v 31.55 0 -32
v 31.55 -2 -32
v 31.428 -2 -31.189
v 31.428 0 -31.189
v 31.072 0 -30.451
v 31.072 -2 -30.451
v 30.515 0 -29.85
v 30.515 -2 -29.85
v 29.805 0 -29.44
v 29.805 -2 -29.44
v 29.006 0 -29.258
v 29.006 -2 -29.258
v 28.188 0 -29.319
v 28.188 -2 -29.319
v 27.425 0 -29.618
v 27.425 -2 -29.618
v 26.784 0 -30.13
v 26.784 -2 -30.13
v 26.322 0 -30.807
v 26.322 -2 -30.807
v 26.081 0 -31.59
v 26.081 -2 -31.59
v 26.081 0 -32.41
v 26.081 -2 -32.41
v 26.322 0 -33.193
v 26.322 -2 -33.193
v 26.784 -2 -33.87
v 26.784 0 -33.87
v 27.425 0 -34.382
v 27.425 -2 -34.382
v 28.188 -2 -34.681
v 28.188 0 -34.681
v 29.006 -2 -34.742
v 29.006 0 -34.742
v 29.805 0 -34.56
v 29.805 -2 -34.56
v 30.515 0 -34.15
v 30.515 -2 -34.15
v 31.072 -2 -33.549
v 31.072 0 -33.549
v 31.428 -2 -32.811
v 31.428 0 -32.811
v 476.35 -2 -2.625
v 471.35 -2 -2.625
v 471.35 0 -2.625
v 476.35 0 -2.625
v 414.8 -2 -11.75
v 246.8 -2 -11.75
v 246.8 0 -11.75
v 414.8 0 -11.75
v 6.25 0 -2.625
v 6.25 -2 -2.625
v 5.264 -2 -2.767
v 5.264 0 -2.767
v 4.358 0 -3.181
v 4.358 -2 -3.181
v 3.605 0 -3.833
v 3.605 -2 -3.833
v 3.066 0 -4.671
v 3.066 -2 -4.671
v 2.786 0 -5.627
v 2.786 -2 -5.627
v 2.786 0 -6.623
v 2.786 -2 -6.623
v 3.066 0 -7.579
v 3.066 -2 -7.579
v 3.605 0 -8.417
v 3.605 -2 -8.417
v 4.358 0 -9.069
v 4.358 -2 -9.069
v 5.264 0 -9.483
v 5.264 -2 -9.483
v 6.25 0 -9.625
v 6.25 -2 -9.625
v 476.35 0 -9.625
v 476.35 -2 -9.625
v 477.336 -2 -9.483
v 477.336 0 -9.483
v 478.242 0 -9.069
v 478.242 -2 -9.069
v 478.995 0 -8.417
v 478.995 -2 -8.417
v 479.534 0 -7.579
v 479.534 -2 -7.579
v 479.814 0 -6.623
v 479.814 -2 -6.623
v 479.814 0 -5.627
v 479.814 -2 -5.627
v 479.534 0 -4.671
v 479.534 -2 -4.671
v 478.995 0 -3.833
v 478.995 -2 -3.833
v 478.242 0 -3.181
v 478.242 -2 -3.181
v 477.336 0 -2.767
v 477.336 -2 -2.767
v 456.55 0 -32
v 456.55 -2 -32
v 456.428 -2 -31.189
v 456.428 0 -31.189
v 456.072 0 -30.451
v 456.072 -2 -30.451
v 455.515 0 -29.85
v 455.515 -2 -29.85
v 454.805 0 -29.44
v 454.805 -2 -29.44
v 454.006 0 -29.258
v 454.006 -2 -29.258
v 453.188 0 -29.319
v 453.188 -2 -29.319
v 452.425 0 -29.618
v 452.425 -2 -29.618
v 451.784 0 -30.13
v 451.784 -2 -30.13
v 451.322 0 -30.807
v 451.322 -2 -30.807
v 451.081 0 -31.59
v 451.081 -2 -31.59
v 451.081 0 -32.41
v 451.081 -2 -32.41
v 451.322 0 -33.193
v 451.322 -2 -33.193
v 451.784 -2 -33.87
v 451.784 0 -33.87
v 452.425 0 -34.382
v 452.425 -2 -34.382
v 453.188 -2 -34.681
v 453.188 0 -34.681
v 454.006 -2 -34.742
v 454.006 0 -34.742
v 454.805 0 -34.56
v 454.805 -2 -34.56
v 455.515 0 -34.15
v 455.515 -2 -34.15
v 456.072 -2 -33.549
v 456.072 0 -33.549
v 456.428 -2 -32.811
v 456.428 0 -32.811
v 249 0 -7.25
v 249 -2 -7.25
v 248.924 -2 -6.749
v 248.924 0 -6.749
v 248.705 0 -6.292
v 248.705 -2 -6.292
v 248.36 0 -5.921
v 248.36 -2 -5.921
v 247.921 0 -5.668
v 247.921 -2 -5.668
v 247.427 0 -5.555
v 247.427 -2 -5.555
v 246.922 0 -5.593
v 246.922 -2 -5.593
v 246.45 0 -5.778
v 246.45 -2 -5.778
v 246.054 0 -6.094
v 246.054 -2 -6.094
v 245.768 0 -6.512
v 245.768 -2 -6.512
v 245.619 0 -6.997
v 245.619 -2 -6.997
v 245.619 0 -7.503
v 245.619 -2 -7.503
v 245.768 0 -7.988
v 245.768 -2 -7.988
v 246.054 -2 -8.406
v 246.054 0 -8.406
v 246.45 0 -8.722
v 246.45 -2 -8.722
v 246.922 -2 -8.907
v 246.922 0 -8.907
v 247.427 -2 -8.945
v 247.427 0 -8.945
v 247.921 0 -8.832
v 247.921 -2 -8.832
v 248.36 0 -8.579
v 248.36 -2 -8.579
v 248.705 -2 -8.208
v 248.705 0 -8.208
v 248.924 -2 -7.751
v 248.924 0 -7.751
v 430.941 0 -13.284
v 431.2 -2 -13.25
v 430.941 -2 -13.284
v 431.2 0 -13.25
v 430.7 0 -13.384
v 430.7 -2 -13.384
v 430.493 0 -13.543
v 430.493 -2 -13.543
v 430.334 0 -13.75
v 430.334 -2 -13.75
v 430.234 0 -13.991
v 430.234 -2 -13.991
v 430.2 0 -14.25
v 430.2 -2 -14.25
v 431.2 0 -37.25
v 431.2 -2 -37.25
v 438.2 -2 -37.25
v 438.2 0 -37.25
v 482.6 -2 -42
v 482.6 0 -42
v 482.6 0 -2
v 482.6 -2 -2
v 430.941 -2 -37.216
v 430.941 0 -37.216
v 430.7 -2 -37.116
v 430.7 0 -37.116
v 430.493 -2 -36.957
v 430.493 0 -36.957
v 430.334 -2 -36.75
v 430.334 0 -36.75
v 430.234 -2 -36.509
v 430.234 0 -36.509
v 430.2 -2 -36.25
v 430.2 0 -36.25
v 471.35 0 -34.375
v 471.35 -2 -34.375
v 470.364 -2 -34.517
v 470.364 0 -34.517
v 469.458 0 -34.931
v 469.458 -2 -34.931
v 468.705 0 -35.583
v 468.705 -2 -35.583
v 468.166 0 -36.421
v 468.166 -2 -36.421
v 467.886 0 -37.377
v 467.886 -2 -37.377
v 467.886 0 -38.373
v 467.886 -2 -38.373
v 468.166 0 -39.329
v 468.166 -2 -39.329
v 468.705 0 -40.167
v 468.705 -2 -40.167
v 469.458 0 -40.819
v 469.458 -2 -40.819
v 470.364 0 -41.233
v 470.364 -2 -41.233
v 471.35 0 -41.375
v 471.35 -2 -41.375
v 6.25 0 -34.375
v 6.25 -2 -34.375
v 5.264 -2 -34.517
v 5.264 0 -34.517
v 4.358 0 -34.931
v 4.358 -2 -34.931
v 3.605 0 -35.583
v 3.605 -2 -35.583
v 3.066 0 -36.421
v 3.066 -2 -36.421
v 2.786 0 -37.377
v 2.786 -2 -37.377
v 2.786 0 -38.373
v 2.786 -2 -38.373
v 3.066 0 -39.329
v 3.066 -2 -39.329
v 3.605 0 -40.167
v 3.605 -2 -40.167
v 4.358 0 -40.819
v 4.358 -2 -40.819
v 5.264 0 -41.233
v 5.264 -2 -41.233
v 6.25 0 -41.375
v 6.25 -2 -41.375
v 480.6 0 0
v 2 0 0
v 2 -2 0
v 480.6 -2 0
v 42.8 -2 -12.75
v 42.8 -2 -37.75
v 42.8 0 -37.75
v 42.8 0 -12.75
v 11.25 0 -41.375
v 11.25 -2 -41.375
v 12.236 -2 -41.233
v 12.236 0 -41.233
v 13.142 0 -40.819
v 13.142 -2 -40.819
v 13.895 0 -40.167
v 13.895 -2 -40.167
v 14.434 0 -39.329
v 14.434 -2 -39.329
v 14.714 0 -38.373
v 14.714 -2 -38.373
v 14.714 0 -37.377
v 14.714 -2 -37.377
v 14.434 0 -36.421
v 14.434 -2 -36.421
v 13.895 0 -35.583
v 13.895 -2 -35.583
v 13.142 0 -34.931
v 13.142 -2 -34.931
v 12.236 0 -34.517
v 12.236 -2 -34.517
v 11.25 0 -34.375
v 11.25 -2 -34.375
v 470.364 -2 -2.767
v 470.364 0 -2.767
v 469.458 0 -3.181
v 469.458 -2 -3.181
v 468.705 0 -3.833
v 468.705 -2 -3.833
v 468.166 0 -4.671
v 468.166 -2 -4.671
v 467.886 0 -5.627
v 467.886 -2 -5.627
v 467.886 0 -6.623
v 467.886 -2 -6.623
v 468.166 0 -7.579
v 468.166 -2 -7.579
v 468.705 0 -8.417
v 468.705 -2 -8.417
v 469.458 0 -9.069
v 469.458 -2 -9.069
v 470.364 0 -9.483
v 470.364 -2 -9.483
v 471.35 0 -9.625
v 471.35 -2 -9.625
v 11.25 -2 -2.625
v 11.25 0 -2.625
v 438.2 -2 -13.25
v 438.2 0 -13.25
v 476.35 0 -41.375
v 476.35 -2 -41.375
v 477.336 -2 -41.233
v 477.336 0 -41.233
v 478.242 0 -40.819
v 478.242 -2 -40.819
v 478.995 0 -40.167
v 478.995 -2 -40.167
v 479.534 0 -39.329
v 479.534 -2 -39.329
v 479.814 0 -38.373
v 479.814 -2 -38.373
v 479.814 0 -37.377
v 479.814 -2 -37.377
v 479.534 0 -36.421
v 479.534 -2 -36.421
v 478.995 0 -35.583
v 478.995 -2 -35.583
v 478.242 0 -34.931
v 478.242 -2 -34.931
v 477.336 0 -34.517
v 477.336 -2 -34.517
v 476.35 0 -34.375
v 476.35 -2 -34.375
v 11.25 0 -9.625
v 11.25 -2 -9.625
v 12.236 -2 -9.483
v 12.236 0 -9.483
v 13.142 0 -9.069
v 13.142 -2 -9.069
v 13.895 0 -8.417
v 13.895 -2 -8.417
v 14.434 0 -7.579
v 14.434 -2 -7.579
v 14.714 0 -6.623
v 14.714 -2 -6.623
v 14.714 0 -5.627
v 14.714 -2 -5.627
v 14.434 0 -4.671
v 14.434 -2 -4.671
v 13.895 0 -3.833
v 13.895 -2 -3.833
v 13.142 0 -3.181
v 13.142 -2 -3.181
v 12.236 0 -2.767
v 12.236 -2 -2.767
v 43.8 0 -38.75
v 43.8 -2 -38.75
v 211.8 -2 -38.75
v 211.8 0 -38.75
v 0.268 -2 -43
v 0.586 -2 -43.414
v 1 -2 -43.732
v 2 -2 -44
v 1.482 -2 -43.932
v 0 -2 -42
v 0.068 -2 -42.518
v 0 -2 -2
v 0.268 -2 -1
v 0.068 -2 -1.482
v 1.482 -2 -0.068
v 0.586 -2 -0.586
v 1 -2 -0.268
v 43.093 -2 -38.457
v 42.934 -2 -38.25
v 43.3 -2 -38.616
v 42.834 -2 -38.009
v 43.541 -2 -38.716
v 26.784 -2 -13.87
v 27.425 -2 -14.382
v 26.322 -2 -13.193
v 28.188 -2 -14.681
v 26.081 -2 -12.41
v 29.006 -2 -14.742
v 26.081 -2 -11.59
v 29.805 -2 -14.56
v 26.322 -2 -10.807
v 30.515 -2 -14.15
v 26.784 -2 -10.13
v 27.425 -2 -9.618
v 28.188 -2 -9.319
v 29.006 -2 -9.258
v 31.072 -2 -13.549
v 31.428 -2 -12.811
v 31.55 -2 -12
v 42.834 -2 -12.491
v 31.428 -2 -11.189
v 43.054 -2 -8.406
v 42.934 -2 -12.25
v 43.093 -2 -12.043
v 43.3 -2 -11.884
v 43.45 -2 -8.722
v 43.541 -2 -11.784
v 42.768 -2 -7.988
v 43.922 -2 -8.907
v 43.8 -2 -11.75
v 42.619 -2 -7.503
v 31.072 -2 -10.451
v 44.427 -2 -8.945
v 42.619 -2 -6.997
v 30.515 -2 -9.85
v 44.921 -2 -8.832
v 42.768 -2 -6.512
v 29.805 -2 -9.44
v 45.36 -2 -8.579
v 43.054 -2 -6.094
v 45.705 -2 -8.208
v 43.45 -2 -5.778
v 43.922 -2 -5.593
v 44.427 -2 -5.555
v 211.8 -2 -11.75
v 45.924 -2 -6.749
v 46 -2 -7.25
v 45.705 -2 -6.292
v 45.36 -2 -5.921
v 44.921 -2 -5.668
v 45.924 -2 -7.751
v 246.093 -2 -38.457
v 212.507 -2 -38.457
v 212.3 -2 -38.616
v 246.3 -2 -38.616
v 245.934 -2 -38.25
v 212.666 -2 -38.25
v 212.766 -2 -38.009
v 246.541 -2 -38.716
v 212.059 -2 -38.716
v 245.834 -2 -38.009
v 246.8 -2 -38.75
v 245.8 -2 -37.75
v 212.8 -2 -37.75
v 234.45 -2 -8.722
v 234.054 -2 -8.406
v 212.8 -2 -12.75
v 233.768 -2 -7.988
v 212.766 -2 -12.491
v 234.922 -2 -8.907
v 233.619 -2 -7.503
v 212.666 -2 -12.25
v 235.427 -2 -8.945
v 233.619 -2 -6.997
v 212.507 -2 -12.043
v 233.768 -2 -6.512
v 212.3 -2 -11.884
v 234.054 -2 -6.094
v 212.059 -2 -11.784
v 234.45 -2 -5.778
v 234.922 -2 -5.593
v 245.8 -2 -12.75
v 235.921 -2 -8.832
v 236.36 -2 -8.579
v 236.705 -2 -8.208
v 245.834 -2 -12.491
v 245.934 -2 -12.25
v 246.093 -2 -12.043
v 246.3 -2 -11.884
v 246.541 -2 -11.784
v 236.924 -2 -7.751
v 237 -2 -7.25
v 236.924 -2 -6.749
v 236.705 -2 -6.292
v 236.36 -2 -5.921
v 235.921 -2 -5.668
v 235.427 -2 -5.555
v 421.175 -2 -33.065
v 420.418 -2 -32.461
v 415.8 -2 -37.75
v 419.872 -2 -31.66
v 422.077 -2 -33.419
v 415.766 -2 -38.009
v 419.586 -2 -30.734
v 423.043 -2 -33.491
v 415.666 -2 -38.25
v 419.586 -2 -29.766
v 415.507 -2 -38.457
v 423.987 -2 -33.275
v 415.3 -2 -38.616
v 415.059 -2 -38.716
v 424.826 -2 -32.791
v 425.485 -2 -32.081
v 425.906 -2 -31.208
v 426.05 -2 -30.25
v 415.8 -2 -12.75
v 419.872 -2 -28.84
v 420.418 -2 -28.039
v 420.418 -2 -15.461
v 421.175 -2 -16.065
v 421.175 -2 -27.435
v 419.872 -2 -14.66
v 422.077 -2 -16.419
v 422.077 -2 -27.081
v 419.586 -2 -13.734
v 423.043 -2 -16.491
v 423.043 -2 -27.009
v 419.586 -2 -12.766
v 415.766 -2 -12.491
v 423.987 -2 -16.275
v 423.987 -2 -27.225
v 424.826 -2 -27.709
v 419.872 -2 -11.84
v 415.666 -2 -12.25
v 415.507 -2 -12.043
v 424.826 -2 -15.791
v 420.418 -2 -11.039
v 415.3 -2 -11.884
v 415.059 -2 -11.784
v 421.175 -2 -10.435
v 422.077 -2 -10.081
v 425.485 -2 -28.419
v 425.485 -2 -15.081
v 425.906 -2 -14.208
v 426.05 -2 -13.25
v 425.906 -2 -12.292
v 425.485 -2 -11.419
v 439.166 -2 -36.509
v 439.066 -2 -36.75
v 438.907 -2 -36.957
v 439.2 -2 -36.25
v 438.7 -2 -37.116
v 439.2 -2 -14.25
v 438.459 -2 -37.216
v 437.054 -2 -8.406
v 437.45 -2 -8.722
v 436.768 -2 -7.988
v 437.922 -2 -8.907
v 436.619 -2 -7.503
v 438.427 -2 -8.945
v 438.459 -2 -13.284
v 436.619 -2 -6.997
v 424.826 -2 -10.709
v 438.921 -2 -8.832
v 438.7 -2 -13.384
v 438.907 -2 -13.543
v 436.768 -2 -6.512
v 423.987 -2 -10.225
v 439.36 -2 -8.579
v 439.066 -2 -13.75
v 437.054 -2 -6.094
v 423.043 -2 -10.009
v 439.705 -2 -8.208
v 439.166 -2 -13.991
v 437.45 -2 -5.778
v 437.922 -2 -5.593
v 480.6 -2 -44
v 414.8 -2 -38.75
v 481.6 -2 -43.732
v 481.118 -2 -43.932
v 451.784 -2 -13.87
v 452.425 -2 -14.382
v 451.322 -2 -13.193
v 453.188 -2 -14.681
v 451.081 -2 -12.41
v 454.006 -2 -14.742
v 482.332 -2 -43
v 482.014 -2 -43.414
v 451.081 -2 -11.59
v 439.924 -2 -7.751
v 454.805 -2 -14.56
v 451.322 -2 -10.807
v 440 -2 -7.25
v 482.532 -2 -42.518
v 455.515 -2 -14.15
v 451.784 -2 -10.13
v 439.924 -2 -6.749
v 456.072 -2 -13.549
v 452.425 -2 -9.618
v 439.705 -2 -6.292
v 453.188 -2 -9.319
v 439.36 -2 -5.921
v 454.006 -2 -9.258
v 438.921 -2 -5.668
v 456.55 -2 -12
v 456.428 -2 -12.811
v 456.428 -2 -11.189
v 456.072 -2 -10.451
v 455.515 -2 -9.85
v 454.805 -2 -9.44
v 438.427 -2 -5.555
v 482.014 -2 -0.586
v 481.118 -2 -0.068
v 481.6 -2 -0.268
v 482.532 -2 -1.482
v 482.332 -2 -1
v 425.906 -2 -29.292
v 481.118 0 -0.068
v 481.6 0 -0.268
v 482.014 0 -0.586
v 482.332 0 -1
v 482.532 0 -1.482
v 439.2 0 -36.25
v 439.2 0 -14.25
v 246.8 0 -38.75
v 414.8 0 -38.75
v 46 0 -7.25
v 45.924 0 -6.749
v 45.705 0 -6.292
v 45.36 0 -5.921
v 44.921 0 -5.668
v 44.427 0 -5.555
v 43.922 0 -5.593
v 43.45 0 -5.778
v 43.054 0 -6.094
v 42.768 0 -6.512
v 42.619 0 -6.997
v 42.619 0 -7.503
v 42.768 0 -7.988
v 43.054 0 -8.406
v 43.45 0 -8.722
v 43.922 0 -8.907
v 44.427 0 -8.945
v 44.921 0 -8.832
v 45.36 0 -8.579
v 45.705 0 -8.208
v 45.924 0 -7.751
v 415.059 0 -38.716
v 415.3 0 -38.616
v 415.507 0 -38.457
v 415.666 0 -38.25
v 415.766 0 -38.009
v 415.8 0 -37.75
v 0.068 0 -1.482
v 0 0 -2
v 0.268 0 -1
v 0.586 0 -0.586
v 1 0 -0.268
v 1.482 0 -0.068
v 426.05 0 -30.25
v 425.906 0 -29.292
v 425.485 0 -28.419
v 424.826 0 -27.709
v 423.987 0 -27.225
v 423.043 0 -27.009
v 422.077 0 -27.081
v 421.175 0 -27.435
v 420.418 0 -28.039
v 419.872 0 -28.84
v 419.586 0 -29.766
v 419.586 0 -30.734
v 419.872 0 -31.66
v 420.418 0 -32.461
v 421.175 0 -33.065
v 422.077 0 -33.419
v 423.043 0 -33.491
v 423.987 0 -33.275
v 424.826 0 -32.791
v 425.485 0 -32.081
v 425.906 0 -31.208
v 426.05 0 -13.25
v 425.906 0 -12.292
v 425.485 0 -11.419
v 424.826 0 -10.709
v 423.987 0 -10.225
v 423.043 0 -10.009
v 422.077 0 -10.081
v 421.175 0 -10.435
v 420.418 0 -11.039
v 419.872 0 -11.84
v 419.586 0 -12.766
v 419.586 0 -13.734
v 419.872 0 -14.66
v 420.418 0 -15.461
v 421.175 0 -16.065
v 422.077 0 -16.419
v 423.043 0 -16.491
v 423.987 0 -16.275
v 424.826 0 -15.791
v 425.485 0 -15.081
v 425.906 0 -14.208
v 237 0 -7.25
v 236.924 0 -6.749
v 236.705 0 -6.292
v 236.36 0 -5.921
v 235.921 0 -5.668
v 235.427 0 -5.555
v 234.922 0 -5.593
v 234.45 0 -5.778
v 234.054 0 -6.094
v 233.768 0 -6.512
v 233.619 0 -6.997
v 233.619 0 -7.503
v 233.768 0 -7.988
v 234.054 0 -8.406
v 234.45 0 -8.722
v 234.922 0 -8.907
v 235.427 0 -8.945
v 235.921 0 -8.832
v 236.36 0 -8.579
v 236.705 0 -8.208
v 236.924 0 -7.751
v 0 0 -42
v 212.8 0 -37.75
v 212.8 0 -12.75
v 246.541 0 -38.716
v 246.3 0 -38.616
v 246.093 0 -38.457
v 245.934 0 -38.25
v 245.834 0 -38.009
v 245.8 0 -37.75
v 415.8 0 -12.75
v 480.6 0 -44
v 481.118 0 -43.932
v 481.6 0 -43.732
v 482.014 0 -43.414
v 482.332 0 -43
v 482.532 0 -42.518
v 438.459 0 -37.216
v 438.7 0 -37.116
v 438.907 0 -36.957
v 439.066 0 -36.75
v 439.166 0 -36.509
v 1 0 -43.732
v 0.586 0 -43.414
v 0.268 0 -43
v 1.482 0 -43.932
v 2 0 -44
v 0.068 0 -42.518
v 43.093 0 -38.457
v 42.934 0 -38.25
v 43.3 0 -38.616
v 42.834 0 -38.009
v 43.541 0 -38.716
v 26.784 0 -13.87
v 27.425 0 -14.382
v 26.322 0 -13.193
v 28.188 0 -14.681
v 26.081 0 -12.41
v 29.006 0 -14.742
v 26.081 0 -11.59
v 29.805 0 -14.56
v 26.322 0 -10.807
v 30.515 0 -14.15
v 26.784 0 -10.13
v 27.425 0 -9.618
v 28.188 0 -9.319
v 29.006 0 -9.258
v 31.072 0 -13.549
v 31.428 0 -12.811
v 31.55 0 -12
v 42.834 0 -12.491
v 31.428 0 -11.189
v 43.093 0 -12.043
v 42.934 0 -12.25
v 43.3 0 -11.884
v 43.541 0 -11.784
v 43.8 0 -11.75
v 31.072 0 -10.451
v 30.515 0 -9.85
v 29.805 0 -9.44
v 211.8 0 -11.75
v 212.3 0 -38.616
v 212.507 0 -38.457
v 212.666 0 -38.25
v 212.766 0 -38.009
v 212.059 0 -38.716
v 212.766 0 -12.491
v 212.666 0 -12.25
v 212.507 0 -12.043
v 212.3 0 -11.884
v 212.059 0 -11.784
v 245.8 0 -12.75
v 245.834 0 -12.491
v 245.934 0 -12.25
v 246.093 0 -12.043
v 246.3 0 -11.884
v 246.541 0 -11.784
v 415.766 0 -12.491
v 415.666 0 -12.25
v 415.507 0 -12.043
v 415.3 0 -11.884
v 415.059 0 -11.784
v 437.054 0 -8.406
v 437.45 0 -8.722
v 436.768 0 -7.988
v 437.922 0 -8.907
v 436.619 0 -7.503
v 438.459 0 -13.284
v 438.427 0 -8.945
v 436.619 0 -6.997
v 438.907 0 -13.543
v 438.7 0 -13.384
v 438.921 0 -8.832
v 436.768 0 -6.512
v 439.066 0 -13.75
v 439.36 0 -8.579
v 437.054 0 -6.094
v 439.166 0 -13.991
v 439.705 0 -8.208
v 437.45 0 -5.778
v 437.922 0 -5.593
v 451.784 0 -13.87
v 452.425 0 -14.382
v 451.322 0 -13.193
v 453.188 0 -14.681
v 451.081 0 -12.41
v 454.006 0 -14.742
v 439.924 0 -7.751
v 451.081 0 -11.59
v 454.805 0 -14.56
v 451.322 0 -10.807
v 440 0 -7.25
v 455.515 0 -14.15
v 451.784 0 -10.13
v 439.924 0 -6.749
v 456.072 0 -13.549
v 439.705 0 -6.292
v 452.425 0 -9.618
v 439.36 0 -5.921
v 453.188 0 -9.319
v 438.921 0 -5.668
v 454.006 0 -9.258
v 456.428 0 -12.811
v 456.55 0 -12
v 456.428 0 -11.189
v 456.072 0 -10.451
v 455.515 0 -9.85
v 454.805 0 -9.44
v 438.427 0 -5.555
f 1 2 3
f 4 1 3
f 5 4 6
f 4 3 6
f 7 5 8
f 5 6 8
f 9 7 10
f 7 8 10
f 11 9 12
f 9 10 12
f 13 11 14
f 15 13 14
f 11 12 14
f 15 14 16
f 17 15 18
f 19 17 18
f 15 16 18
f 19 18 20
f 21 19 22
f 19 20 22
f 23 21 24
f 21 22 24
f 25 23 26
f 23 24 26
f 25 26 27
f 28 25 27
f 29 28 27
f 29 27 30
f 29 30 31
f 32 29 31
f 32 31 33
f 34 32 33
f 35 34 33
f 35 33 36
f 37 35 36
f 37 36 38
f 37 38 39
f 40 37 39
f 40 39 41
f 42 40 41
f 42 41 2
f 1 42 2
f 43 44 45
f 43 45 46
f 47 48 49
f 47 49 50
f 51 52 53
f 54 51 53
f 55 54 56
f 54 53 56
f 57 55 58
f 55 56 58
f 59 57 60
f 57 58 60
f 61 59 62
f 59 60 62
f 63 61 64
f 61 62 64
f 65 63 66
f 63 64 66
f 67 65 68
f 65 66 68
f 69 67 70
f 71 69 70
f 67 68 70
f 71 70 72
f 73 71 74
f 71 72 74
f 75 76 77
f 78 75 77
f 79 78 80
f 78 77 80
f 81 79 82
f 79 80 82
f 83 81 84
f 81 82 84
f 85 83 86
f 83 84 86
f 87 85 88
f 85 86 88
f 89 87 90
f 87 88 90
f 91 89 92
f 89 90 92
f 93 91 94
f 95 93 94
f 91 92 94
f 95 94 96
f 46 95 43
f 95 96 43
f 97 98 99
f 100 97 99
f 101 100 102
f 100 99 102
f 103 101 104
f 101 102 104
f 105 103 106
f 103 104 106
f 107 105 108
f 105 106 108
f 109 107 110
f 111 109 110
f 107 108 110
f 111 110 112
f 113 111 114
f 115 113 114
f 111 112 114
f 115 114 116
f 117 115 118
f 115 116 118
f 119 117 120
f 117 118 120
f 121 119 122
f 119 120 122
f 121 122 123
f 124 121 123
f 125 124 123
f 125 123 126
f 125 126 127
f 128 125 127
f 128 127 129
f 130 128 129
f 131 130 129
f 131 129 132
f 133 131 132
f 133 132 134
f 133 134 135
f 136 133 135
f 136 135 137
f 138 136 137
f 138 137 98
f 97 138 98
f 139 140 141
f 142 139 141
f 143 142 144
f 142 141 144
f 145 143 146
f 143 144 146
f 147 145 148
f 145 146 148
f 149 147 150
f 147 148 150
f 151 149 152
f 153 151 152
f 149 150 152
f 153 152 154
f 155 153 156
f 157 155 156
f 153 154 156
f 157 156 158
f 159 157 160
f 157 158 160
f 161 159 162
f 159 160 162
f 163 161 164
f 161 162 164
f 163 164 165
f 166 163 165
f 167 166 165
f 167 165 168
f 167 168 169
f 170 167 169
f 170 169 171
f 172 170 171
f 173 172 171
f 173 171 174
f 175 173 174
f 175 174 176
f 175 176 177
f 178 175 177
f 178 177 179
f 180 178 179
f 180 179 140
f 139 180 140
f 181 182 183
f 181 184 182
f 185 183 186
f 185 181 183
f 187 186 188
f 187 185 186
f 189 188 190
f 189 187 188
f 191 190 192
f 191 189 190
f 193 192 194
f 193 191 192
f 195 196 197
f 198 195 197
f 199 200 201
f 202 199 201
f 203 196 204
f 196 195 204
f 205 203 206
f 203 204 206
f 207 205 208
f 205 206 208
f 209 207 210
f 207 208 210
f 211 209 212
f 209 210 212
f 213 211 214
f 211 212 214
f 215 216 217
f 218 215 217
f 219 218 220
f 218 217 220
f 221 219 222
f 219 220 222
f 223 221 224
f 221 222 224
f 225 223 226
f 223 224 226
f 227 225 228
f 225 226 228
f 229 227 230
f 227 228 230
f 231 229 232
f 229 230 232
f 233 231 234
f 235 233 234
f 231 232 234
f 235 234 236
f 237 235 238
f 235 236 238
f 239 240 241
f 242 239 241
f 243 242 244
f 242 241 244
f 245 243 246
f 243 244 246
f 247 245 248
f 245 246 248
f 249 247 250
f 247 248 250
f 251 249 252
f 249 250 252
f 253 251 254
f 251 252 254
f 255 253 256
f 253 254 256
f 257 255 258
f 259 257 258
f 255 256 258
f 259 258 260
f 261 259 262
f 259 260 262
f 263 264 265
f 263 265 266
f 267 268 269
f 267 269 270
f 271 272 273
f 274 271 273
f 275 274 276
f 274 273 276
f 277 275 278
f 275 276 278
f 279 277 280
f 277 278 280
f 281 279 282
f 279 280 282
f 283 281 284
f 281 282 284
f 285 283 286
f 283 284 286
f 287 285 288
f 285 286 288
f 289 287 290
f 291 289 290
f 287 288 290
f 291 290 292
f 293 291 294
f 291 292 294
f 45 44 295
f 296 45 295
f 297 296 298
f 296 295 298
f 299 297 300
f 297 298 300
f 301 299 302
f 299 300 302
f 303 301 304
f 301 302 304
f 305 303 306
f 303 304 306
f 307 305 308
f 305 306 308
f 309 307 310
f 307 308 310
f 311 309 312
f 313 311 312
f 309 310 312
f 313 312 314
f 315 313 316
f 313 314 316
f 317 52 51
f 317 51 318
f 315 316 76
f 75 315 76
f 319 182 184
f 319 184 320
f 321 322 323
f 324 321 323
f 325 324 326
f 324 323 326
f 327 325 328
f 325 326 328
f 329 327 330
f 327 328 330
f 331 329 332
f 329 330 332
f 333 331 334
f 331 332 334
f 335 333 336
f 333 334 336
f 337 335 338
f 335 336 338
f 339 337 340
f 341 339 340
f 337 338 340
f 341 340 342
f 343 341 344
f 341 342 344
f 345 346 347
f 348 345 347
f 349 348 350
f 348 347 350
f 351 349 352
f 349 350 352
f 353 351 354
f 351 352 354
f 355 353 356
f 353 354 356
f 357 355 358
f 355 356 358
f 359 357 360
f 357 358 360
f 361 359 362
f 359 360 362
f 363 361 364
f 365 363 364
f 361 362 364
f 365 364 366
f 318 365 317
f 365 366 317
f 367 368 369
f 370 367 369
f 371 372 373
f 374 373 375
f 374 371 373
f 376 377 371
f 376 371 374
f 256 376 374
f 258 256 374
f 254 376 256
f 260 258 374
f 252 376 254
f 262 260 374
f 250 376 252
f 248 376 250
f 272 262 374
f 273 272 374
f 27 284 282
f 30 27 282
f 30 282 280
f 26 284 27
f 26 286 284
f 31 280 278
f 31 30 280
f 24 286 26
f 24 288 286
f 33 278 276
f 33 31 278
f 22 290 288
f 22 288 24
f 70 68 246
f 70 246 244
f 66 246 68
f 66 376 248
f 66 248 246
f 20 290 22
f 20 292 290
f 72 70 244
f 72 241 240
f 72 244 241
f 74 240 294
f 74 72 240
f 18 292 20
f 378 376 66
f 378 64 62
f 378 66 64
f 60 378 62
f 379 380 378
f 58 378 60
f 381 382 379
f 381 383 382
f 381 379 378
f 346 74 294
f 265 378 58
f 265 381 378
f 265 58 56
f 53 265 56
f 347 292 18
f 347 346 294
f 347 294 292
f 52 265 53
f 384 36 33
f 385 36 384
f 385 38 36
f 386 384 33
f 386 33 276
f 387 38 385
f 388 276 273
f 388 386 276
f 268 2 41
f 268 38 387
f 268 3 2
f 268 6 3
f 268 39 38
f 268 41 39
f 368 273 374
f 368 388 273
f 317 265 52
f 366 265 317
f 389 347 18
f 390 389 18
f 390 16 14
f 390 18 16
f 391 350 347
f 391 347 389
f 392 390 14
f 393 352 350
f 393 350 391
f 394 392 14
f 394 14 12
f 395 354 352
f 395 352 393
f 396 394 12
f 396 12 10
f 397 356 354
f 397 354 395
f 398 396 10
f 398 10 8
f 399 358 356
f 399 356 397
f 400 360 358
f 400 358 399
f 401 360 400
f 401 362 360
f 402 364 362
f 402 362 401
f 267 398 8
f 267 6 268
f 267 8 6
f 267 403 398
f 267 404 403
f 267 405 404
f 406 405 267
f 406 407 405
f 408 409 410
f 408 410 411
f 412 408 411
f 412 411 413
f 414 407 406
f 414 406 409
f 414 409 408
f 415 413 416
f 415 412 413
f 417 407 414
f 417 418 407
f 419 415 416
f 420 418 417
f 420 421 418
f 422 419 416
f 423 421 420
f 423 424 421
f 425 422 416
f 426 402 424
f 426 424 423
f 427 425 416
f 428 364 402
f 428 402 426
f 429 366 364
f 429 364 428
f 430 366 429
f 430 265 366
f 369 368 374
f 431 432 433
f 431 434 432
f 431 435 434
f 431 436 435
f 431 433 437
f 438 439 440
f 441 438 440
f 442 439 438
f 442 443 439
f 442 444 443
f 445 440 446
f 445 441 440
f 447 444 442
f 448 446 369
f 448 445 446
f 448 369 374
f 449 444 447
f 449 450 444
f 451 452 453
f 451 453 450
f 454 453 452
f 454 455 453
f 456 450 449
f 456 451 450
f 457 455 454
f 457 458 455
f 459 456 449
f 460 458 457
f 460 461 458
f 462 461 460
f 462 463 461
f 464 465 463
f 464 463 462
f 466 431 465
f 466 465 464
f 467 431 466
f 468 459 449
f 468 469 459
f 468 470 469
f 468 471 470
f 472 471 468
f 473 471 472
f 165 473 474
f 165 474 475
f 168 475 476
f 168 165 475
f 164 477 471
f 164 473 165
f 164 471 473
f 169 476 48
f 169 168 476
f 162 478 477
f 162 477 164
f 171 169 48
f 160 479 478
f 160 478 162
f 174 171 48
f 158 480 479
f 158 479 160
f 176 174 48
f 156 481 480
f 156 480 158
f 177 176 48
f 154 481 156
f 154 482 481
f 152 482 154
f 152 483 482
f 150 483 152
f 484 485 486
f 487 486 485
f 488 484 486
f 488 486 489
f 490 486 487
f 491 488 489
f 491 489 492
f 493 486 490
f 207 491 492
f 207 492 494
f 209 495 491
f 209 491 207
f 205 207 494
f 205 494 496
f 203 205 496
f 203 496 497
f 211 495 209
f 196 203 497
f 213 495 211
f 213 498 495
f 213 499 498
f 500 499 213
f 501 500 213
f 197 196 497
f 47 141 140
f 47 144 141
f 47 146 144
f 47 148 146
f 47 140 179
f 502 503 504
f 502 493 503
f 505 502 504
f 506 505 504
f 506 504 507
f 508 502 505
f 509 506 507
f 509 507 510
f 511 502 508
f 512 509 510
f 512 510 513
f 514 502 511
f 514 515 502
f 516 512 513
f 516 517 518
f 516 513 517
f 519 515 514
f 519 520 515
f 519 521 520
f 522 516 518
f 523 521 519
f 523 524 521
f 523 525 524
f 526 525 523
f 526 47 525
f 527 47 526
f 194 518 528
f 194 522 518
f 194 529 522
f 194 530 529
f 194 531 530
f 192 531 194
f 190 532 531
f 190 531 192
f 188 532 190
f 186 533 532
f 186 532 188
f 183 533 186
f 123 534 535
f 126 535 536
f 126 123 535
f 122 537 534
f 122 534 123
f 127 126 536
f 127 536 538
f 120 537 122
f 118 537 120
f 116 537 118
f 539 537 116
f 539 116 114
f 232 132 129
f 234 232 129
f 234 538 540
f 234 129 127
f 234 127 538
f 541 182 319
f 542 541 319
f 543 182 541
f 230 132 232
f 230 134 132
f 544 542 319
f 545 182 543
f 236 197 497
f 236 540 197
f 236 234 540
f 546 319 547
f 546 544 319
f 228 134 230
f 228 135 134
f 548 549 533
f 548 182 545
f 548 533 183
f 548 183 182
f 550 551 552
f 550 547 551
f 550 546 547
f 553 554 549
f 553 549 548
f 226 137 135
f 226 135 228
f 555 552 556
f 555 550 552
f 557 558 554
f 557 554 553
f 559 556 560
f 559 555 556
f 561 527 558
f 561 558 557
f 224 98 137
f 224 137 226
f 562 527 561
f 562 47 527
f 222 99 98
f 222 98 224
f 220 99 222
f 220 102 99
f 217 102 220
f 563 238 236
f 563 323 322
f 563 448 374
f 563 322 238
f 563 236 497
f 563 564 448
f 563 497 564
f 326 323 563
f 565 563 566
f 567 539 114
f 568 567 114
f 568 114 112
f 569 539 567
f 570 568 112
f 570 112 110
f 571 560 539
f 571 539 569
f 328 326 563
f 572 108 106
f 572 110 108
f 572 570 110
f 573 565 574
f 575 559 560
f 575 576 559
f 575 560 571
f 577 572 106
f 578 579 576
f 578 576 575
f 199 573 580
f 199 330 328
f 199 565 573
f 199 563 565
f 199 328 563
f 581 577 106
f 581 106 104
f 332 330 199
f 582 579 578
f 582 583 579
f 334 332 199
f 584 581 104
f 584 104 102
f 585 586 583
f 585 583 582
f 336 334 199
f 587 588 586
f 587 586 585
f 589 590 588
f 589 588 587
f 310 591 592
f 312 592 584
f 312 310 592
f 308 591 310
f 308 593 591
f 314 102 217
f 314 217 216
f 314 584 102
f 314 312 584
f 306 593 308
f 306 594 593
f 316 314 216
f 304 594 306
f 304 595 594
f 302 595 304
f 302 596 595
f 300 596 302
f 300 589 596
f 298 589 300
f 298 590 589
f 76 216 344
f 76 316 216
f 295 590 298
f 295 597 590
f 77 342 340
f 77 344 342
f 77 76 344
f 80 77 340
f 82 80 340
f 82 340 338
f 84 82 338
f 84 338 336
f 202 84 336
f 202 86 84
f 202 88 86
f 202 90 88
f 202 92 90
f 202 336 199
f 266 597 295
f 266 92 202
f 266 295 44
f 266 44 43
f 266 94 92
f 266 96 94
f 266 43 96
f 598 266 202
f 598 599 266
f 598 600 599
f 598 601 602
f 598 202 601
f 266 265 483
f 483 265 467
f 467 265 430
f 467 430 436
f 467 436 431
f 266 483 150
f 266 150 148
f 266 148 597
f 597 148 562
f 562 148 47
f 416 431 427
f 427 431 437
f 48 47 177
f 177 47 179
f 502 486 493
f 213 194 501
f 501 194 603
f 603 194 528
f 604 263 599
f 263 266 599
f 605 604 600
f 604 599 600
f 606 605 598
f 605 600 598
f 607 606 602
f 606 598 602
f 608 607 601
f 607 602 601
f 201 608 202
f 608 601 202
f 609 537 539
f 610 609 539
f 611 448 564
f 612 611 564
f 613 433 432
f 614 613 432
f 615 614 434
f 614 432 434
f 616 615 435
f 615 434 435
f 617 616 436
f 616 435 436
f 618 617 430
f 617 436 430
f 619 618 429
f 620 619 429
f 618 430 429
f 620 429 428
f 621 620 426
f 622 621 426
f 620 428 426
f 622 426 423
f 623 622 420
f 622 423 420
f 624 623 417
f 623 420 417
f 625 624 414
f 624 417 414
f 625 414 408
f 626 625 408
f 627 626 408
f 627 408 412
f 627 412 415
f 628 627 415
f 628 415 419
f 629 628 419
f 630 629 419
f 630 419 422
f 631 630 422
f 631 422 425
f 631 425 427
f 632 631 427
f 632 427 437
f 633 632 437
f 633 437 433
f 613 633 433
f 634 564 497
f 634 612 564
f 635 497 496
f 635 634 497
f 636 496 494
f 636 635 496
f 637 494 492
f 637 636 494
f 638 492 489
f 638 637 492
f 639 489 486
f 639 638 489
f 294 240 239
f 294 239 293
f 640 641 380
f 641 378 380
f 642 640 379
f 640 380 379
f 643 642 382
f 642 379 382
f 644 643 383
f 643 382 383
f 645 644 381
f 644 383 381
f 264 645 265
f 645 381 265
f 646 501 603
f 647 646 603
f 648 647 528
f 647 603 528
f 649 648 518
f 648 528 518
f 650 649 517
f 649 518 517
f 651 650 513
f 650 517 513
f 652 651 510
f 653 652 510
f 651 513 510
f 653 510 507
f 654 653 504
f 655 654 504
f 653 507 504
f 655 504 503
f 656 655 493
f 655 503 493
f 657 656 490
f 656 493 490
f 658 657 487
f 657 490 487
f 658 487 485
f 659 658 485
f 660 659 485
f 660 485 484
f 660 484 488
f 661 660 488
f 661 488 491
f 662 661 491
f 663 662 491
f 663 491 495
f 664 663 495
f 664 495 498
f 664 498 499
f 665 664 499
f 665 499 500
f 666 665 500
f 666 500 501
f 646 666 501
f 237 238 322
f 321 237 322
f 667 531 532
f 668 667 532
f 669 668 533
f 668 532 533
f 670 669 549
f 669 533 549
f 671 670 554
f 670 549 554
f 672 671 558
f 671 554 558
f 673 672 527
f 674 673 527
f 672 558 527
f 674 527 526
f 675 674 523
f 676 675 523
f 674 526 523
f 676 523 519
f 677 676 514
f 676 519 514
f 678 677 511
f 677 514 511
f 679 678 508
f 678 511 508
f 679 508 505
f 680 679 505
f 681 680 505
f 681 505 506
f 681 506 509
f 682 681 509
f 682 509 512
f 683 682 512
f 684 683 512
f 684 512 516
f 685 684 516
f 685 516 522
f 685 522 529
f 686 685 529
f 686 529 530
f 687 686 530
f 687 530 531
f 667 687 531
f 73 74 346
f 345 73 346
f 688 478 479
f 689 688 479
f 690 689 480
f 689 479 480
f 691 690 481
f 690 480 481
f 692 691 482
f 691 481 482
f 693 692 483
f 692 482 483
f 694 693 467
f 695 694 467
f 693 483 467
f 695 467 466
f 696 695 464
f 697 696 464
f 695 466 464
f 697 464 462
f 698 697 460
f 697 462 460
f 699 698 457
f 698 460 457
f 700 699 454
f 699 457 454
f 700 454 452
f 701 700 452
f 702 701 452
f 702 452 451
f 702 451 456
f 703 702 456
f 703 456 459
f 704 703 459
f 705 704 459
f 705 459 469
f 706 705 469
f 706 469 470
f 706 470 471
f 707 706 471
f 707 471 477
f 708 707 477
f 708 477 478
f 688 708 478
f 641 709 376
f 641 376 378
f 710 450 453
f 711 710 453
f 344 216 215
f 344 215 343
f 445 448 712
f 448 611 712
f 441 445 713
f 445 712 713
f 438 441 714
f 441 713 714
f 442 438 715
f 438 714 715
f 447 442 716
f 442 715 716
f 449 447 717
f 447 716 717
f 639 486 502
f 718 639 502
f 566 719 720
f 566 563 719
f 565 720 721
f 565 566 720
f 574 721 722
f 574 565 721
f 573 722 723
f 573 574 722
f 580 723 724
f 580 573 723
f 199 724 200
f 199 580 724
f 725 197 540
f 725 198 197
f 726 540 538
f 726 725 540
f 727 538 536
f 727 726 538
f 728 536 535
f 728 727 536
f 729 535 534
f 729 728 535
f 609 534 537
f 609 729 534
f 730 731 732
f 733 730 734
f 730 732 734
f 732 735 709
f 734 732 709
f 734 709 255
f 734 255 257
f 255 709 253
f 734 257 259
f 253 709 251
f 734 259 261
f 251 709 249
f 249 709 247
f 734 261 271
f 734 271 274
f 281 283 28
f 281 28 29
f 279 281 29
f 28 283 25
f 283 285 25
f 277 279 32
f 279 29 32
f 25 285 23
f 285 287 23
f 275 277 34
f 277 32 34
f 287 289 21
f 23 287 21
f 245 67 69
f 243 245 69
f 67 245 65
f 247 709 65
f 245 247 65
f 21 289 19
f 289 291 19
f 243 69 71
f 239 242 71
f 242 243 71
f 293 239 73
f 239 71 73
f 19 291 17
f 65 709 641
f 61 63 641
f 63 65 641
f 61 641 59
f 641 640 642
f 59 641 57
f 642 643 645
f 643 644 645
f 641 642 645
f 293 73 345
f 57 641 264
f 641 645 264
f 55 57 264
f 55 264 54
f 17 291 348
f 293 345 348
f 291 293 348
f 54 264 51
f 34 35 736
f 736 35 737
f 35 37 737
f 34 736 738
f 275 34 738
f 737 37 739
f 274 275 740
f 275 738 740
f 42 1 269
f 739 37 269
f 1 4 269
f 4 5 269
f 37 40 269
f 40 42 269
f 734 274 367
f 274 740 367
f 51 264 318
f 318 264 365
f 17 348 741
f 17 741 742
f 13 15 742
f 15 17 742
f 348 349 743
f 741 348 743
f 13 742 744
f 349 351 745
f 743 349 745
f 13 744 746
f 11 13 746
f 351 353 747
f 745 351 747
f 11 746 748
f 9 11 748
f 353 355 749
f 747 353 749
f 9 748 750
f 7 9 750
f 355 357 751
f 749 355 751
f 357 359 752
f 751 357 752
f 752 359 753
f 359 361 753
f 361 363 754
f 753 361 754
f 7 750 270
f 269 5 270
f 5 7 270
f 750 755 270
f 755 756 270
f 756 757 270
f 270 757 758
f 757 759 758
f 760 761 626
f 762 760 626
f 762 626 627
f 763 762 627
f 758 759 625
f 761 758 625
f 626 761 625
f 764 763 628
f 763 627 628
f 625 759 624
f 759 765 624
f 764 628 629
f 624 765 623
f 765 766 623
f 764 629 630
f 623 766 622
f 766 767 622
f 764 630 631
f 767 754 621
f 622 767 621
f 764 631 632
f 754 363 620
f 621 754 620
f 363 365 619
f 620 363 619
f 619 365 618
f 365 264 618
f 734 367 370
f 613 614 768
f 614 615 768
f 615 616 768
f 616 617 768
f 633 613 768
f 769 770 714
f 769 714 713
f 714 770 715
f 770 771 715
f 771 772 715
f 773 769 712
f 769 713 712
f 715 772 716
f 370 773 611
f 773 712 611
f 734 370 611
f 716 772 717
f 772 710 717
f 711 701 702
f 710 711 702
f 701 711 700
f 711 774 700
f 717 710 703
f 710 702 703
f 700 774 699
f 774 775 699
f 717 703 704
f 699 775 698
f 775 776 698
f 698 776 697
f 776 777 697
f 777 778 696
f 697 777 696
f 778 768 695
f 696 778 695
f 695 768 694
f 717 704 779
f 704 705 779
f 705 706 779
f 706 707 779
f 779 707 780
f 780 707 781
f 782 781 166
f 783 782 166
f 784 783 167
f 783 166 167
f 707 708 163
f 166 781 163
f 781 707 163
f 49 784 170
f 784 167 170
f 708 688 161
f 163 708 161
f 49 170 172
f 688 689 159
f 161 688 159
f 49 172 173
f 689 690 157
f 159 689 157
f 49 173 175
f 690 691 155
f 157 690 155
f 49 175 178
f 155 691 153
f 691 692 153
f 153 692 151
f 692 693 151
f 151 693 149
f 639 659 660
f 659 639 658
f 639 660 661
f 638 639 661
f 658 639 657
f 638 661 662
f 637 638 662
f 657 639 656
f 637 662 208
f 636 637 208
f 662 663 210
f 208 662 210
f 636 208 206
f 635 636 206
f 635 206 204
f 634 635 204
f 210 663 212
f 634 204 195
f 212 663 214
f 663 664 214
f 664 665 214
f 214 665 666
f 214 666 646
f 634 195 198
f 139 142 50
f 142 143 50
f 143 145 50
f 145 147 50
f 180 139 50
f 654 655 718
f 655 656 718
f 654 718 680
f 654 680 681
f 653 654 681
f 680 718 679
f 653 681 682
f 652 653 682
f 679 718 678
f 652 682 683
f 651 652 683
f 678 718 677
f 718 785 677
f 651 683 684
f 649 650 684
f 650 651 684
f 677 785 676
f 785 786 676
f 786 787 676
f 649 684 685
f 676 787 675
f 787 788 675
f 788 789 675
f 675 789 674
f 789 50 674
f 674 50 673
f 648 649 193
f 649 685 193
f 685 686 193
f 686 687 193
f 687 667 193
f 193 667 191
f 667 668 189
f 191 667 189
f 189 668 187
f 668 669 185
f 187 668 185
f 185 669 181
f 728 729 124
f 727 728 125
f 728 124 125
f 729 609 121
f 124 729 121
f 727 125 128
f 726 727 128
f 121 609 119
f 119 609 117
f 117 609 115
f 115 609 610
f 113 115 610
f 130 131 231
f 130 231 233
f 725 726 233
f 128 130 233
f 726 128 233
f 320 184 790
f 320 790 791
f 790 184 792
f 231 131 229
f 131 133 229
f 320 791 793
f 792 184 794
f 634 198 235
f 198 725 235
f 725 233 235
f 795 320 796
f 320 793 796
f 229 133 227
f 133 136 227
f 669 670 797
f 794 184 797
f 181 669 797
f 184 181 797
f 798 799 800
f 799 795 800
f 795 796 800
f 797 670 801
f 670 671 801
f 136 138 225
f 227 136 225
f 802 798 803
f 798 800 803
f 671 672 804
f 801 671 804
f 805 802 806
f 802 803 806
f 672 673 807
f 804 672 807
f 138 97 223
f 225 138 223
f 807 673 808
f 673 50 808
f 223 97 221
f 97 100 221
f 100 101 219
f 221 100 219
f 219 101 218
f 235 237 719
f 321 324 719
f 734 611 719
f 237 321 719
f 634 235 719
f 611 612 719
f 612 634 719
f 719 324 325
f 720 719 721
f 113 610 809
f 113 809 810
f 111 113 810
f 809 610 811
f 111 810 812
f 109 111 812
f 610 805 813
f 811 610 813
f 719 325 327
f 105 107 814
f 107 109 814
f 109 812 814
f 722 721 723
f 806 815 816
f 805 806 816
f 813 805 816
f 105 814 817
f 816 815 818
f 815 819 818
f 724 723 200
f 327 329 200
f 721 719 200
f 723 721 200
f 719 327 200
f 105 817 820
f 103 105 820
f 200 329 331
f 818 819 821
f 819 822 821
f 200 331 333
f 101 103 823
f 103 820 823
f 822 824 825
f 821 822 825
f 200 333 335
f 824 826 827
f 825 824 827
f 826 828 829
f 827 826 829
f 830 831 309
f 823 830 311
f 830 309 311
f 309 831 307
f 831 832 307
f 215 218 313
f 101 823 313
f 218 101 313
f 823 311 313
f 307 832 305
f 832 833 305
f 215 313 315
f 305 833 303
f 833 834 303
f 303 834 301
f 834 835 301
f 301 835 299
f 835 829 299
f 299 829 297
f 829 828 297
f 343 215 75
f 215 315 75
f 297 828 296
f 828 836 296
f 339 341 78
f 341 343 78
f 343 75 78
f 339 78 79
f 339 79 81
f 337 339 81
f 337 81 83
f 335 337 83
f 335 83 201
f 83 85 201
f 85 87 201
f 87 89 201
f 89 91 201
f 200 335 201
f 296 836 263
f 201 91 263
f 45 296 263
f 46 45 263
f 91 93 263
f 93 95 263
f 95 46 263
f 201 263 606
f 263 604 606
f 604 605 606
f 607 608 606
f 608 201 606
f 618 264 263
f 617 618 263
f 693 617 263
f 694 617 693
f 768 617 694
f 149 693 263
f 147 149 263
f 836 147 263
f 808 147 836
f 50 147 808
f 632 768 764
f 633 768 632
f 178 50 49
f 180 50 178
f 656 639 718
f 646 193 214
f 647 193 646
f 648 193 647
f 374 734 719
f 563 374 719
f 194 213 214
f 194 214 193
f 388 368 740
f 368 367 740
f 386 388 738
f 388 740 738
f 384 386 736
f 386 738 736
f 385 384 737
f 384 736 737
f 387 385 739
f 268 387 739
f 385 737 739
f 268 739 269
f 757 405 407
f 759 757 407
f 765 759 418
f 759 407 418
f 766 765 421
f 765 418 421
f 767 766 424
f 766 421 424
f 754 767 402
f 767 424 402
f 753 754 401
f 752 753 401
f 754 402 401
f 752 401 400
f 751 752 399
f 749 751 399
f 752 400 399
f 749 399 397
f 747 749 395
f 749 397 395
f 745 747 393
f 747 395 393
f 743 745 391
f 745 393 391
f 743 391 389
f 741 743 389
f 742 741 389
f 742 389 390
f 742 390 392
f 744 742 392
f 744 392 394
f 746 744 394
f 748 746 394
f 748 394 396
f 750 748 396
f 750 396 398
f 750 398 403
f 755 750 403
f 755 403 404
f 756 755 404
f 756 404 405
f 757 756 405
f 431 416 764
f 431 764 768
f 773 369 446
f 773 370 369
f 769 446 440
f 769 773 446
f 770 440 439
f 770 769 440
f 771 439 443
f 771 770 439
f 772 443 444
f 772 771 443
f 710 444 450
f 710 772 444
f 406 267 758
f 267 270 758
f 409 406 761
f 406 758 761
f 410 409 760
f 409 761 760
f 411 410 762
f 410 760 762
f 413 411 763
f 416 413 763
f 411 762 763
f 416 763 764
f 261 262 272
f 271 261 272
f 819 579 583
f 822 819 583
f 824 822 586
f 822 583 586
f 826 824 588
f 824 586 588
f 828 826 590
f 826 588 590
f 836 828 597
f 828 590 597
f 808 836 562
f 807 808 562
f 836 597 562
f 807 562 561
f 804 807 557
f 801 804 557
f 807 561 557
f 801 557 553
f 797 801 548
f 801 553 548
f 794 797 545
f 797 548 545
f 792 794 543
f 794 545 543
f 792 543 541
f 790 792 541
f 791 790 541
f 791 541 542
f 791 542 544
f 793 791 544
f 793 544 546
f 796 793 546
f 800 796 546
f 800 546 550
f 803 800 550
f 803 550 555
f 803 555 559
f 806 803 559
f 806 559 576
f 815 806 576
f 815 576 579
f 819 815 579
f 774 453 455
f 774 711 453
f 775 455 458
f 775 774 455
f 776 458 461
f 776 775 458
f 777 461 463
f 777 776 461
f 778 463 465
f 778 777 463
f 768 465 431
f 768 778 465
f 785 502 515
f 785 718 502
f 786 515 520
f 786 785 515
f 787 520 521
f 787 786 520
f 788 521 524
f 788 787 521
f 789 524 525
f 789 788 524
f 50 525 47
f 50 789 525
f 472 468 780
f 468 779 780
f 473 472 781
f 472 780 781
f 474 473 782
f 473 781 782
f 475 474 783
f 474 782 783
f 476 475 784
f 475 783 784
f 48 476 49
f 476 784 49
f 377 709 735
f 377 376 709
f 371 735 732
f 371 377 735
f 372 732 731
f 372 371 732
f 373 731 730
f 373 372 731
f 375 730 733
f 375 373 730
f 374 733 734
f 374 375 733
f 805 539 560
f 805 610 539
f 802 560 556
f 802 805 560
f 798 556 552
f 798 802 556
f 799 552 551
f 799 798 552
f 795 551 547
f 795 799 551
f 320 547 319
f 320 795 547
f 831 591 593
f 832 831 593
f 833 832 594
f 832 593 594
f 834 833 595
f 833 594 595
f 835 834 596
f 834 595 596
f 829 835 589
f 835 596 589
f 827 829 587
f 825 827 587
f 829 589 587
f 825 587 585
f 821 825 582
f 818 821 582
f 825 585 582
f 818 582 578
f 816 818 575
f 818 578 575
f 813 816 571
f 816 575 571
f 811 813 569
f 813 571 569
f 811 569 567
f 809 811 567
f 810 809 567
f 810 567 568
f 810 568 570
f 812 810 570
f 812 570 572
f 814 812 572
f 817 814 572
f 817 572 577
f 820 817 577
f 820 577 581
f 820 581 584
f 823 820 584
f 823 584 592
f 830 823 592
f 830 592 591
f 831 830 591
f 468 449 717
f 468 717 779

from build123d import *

# Parameters (mm, degrees)
SKETCH_W            = 482.6
SKETCH_H            = 44
PAD_DEPTH           = 2
POCKET_DEPTH        = 2.001
SKETCH002_R         = 2.75
HOLE_DEPTH          = 2.001
SKETCH003_R         = 1.7
HOLE001_DEPTH       = 2.001
SKETCH004_W         = 170
SKETCH004_H         = 27
POCKET001_DEPTH     = 2.001
LINEARPATTERN_COUNT = 2
LINEARPATTERN_PITCH = 203
SKETCH005_R         = 3.25
POCKET002_DEPTH     = 2.001
SKETCH006_W         = 9
SKETCH006_H         = 24
POCKET003_DEPTH     = 2.001
FILLET_R            = 1
FILLET001_R         = 2


with BuildPart() as part:
    # Sketch → Pad (new body)
    with BuildSketch(Plane.XZ):
        with Locations((241.3, -22)):
            Rectangle(SKETCH_W, SKETCH_H)
    extrude(amount=PAD_DEPTH)

    # Sketch001 (on Face6 of Pad) → Pocket (cut, through all)
    with BuildSketch(Plane.XZ.offset(2)):
        with BuildLine():
            ThreePointArc((471.35, -34.375), (467.85, -37.875), (471.35, -41.375))
            Line((471.35, -41.375), (476.35, -41.375))
            ThreePointArc((476.35, -41.375), (479.85, -37.875), (476.35, -34.375))
            Line((471.35, -34.375), (476.35, -34.375))
        make_face()
        with BuildLine():
            ThreePointArc((6.25, -34.375), (2.75, -37.875), (6.25, -41.375))
            Line((6.25, -41.375), (11.25, -41.375))
            ThreePointArc((11.25, -41.375), (14.75, -37.875), (11.25, -34.375))
            Line((6.25, -34.375), (11.25, -34.375))
        make_face()
        with BuildLine():
            ThreePointArc((471.35, -2.625), (467.85, -6.125), (471.35, -9.625))
            Line((471.35, -9.625), (476.35, -9.625))
            ThreePointArc((476.35, -9.625), (479.85, -6.125), (476.35, -2.625))
            Line((471.35, -2.625), (476.35, -2.625))
        make_face()
        with BuildLine():
            ThreePointArc((6.25, -2.625), (2.75, -6.125), (6.25, -9.625))
            Line((6.25, -9.625), (11.25, -9.625))
            ThreePointArc((11.25, -9.625), (14.75, -6.125), (11.25, -2.625))
            Line((6.25, -2.625), (11.25, -2.625))
        make_face()
    extrude(amount=-POCKET_DEPTH, mode=Mode.SUBTRACT)

    # Sketch002 (on Face5 of Pocket) → Hole (cut, through all)
    with BuildSketch(Plane.XZ.offset(2)):
        with Locations((28.8, -12)):
            Circle(SKETCH002_R)
        with Locations((28.8, -32)):
            Circle(SKETCH002_R)
        with Locations((453.8, -12)):
            Circle(SKETCH002_R)
        with Locations((453.8, -32)):
            Circle(SKETCH002_R)
    extrude(amount=-HOLE_DEPTH, mode=Mode.SUBTRACT)

    # Sketch003 (on Face5 of Hole) → Hole001 (cut, through all)
    with BuildSketch(Plane.XZ.offset(2)):
        with Locations((438.3, -7.25)):
            Circle(SKETCH003_R)
        with Locations((247.3, -7.25)):
            Circle(SKETCH003_R)
        with Locations((235.3, -7.25)):
            Circle(SKETCH003_R)
        with Locations((44.3, -7.25)):
            Circle(SKETCH003_R)
    extrude(amount=-HOLE001_DEPTH, mode=Mode.SUBTRACT)

    # Sketch004 (on Face5 of Hole001) → Pocket001 (cut, through all)
    with BuildSketch(Plane.XZ.offset(2)):
        with Locations((127.8, -25.25)):
            Rectangle(SKETCH004_W, SKETCH004_H)
    pocket001 = extrude(amount=-POCKET001_DEPTH, mode=Mode.SUBTRACT)

    # LinearPattern: Pocket001 ×2
    with Locations(*[(i * LINEARPATTERN_PITCH, 0, 0) for i in range(1, LINEARPATTERN_COUNT)]):
        add(pocket001, mode=Mode.SUBTRACT)

    # Sketch005 (on Face5 of LinearPattern) → Pocket002 (cut, through all)
    with BuildSketch(Plane.XZ.offset(2)):
        with Locations((422.8, -13.25)):
            Circle(SKETCH005_R)
        with Locations((422.8, -30.25)):
            Circle(SKETCH005_R)
    extrude(amount=-POCKET002_DEPTH, mode=Mode.SUBTRACT)

    # Sketch006 (on Face5 of Pocket002) → Pocket003 (cut, through all)
    with BuildSketch(Plane.XZ.offset(2)):
        with Locations((434.7, -25.25)):
            Rectangle(SKETCH006_W, SKETCH006_H)
    extrude(amount=-POCKET003_DEPTH, mode=Mode.SUBTRACT)

    # Fillet
    fillet_edges = [part.edges().sort_by_distance(p)[0] for p in [
        (439.2, -1, -13.25),
        (430.2, -1, -13.25),
        (430.2, -1, -37.25),
        (439.2, -1, -37.25),
        (415.8, -1, -11.75),
        (415.8, -1, -38.75),
        (245.8, -1, -11.75),
        (245.8, -1, -38.75),
        (42.8, -1, -38.75),
        (42.8, -1, -11.75),
        (212.8, -1, -11.75),
        (212.8, -1, -38.75),
    ]]
    fillet(fillet_edges, radius=FILLET_R)

    # Fillet001
    fillet001_edges = [part.edges().sort_by_distance(p)[0] for p in [
        (482.6, -1, -44),
        (482.6, -1, 0),
        (0, -1, -44),
        (0, -1, 0),
    ]]
    fillet(fillet001_edges, radius=FILLET001_R)


solid = part.part
